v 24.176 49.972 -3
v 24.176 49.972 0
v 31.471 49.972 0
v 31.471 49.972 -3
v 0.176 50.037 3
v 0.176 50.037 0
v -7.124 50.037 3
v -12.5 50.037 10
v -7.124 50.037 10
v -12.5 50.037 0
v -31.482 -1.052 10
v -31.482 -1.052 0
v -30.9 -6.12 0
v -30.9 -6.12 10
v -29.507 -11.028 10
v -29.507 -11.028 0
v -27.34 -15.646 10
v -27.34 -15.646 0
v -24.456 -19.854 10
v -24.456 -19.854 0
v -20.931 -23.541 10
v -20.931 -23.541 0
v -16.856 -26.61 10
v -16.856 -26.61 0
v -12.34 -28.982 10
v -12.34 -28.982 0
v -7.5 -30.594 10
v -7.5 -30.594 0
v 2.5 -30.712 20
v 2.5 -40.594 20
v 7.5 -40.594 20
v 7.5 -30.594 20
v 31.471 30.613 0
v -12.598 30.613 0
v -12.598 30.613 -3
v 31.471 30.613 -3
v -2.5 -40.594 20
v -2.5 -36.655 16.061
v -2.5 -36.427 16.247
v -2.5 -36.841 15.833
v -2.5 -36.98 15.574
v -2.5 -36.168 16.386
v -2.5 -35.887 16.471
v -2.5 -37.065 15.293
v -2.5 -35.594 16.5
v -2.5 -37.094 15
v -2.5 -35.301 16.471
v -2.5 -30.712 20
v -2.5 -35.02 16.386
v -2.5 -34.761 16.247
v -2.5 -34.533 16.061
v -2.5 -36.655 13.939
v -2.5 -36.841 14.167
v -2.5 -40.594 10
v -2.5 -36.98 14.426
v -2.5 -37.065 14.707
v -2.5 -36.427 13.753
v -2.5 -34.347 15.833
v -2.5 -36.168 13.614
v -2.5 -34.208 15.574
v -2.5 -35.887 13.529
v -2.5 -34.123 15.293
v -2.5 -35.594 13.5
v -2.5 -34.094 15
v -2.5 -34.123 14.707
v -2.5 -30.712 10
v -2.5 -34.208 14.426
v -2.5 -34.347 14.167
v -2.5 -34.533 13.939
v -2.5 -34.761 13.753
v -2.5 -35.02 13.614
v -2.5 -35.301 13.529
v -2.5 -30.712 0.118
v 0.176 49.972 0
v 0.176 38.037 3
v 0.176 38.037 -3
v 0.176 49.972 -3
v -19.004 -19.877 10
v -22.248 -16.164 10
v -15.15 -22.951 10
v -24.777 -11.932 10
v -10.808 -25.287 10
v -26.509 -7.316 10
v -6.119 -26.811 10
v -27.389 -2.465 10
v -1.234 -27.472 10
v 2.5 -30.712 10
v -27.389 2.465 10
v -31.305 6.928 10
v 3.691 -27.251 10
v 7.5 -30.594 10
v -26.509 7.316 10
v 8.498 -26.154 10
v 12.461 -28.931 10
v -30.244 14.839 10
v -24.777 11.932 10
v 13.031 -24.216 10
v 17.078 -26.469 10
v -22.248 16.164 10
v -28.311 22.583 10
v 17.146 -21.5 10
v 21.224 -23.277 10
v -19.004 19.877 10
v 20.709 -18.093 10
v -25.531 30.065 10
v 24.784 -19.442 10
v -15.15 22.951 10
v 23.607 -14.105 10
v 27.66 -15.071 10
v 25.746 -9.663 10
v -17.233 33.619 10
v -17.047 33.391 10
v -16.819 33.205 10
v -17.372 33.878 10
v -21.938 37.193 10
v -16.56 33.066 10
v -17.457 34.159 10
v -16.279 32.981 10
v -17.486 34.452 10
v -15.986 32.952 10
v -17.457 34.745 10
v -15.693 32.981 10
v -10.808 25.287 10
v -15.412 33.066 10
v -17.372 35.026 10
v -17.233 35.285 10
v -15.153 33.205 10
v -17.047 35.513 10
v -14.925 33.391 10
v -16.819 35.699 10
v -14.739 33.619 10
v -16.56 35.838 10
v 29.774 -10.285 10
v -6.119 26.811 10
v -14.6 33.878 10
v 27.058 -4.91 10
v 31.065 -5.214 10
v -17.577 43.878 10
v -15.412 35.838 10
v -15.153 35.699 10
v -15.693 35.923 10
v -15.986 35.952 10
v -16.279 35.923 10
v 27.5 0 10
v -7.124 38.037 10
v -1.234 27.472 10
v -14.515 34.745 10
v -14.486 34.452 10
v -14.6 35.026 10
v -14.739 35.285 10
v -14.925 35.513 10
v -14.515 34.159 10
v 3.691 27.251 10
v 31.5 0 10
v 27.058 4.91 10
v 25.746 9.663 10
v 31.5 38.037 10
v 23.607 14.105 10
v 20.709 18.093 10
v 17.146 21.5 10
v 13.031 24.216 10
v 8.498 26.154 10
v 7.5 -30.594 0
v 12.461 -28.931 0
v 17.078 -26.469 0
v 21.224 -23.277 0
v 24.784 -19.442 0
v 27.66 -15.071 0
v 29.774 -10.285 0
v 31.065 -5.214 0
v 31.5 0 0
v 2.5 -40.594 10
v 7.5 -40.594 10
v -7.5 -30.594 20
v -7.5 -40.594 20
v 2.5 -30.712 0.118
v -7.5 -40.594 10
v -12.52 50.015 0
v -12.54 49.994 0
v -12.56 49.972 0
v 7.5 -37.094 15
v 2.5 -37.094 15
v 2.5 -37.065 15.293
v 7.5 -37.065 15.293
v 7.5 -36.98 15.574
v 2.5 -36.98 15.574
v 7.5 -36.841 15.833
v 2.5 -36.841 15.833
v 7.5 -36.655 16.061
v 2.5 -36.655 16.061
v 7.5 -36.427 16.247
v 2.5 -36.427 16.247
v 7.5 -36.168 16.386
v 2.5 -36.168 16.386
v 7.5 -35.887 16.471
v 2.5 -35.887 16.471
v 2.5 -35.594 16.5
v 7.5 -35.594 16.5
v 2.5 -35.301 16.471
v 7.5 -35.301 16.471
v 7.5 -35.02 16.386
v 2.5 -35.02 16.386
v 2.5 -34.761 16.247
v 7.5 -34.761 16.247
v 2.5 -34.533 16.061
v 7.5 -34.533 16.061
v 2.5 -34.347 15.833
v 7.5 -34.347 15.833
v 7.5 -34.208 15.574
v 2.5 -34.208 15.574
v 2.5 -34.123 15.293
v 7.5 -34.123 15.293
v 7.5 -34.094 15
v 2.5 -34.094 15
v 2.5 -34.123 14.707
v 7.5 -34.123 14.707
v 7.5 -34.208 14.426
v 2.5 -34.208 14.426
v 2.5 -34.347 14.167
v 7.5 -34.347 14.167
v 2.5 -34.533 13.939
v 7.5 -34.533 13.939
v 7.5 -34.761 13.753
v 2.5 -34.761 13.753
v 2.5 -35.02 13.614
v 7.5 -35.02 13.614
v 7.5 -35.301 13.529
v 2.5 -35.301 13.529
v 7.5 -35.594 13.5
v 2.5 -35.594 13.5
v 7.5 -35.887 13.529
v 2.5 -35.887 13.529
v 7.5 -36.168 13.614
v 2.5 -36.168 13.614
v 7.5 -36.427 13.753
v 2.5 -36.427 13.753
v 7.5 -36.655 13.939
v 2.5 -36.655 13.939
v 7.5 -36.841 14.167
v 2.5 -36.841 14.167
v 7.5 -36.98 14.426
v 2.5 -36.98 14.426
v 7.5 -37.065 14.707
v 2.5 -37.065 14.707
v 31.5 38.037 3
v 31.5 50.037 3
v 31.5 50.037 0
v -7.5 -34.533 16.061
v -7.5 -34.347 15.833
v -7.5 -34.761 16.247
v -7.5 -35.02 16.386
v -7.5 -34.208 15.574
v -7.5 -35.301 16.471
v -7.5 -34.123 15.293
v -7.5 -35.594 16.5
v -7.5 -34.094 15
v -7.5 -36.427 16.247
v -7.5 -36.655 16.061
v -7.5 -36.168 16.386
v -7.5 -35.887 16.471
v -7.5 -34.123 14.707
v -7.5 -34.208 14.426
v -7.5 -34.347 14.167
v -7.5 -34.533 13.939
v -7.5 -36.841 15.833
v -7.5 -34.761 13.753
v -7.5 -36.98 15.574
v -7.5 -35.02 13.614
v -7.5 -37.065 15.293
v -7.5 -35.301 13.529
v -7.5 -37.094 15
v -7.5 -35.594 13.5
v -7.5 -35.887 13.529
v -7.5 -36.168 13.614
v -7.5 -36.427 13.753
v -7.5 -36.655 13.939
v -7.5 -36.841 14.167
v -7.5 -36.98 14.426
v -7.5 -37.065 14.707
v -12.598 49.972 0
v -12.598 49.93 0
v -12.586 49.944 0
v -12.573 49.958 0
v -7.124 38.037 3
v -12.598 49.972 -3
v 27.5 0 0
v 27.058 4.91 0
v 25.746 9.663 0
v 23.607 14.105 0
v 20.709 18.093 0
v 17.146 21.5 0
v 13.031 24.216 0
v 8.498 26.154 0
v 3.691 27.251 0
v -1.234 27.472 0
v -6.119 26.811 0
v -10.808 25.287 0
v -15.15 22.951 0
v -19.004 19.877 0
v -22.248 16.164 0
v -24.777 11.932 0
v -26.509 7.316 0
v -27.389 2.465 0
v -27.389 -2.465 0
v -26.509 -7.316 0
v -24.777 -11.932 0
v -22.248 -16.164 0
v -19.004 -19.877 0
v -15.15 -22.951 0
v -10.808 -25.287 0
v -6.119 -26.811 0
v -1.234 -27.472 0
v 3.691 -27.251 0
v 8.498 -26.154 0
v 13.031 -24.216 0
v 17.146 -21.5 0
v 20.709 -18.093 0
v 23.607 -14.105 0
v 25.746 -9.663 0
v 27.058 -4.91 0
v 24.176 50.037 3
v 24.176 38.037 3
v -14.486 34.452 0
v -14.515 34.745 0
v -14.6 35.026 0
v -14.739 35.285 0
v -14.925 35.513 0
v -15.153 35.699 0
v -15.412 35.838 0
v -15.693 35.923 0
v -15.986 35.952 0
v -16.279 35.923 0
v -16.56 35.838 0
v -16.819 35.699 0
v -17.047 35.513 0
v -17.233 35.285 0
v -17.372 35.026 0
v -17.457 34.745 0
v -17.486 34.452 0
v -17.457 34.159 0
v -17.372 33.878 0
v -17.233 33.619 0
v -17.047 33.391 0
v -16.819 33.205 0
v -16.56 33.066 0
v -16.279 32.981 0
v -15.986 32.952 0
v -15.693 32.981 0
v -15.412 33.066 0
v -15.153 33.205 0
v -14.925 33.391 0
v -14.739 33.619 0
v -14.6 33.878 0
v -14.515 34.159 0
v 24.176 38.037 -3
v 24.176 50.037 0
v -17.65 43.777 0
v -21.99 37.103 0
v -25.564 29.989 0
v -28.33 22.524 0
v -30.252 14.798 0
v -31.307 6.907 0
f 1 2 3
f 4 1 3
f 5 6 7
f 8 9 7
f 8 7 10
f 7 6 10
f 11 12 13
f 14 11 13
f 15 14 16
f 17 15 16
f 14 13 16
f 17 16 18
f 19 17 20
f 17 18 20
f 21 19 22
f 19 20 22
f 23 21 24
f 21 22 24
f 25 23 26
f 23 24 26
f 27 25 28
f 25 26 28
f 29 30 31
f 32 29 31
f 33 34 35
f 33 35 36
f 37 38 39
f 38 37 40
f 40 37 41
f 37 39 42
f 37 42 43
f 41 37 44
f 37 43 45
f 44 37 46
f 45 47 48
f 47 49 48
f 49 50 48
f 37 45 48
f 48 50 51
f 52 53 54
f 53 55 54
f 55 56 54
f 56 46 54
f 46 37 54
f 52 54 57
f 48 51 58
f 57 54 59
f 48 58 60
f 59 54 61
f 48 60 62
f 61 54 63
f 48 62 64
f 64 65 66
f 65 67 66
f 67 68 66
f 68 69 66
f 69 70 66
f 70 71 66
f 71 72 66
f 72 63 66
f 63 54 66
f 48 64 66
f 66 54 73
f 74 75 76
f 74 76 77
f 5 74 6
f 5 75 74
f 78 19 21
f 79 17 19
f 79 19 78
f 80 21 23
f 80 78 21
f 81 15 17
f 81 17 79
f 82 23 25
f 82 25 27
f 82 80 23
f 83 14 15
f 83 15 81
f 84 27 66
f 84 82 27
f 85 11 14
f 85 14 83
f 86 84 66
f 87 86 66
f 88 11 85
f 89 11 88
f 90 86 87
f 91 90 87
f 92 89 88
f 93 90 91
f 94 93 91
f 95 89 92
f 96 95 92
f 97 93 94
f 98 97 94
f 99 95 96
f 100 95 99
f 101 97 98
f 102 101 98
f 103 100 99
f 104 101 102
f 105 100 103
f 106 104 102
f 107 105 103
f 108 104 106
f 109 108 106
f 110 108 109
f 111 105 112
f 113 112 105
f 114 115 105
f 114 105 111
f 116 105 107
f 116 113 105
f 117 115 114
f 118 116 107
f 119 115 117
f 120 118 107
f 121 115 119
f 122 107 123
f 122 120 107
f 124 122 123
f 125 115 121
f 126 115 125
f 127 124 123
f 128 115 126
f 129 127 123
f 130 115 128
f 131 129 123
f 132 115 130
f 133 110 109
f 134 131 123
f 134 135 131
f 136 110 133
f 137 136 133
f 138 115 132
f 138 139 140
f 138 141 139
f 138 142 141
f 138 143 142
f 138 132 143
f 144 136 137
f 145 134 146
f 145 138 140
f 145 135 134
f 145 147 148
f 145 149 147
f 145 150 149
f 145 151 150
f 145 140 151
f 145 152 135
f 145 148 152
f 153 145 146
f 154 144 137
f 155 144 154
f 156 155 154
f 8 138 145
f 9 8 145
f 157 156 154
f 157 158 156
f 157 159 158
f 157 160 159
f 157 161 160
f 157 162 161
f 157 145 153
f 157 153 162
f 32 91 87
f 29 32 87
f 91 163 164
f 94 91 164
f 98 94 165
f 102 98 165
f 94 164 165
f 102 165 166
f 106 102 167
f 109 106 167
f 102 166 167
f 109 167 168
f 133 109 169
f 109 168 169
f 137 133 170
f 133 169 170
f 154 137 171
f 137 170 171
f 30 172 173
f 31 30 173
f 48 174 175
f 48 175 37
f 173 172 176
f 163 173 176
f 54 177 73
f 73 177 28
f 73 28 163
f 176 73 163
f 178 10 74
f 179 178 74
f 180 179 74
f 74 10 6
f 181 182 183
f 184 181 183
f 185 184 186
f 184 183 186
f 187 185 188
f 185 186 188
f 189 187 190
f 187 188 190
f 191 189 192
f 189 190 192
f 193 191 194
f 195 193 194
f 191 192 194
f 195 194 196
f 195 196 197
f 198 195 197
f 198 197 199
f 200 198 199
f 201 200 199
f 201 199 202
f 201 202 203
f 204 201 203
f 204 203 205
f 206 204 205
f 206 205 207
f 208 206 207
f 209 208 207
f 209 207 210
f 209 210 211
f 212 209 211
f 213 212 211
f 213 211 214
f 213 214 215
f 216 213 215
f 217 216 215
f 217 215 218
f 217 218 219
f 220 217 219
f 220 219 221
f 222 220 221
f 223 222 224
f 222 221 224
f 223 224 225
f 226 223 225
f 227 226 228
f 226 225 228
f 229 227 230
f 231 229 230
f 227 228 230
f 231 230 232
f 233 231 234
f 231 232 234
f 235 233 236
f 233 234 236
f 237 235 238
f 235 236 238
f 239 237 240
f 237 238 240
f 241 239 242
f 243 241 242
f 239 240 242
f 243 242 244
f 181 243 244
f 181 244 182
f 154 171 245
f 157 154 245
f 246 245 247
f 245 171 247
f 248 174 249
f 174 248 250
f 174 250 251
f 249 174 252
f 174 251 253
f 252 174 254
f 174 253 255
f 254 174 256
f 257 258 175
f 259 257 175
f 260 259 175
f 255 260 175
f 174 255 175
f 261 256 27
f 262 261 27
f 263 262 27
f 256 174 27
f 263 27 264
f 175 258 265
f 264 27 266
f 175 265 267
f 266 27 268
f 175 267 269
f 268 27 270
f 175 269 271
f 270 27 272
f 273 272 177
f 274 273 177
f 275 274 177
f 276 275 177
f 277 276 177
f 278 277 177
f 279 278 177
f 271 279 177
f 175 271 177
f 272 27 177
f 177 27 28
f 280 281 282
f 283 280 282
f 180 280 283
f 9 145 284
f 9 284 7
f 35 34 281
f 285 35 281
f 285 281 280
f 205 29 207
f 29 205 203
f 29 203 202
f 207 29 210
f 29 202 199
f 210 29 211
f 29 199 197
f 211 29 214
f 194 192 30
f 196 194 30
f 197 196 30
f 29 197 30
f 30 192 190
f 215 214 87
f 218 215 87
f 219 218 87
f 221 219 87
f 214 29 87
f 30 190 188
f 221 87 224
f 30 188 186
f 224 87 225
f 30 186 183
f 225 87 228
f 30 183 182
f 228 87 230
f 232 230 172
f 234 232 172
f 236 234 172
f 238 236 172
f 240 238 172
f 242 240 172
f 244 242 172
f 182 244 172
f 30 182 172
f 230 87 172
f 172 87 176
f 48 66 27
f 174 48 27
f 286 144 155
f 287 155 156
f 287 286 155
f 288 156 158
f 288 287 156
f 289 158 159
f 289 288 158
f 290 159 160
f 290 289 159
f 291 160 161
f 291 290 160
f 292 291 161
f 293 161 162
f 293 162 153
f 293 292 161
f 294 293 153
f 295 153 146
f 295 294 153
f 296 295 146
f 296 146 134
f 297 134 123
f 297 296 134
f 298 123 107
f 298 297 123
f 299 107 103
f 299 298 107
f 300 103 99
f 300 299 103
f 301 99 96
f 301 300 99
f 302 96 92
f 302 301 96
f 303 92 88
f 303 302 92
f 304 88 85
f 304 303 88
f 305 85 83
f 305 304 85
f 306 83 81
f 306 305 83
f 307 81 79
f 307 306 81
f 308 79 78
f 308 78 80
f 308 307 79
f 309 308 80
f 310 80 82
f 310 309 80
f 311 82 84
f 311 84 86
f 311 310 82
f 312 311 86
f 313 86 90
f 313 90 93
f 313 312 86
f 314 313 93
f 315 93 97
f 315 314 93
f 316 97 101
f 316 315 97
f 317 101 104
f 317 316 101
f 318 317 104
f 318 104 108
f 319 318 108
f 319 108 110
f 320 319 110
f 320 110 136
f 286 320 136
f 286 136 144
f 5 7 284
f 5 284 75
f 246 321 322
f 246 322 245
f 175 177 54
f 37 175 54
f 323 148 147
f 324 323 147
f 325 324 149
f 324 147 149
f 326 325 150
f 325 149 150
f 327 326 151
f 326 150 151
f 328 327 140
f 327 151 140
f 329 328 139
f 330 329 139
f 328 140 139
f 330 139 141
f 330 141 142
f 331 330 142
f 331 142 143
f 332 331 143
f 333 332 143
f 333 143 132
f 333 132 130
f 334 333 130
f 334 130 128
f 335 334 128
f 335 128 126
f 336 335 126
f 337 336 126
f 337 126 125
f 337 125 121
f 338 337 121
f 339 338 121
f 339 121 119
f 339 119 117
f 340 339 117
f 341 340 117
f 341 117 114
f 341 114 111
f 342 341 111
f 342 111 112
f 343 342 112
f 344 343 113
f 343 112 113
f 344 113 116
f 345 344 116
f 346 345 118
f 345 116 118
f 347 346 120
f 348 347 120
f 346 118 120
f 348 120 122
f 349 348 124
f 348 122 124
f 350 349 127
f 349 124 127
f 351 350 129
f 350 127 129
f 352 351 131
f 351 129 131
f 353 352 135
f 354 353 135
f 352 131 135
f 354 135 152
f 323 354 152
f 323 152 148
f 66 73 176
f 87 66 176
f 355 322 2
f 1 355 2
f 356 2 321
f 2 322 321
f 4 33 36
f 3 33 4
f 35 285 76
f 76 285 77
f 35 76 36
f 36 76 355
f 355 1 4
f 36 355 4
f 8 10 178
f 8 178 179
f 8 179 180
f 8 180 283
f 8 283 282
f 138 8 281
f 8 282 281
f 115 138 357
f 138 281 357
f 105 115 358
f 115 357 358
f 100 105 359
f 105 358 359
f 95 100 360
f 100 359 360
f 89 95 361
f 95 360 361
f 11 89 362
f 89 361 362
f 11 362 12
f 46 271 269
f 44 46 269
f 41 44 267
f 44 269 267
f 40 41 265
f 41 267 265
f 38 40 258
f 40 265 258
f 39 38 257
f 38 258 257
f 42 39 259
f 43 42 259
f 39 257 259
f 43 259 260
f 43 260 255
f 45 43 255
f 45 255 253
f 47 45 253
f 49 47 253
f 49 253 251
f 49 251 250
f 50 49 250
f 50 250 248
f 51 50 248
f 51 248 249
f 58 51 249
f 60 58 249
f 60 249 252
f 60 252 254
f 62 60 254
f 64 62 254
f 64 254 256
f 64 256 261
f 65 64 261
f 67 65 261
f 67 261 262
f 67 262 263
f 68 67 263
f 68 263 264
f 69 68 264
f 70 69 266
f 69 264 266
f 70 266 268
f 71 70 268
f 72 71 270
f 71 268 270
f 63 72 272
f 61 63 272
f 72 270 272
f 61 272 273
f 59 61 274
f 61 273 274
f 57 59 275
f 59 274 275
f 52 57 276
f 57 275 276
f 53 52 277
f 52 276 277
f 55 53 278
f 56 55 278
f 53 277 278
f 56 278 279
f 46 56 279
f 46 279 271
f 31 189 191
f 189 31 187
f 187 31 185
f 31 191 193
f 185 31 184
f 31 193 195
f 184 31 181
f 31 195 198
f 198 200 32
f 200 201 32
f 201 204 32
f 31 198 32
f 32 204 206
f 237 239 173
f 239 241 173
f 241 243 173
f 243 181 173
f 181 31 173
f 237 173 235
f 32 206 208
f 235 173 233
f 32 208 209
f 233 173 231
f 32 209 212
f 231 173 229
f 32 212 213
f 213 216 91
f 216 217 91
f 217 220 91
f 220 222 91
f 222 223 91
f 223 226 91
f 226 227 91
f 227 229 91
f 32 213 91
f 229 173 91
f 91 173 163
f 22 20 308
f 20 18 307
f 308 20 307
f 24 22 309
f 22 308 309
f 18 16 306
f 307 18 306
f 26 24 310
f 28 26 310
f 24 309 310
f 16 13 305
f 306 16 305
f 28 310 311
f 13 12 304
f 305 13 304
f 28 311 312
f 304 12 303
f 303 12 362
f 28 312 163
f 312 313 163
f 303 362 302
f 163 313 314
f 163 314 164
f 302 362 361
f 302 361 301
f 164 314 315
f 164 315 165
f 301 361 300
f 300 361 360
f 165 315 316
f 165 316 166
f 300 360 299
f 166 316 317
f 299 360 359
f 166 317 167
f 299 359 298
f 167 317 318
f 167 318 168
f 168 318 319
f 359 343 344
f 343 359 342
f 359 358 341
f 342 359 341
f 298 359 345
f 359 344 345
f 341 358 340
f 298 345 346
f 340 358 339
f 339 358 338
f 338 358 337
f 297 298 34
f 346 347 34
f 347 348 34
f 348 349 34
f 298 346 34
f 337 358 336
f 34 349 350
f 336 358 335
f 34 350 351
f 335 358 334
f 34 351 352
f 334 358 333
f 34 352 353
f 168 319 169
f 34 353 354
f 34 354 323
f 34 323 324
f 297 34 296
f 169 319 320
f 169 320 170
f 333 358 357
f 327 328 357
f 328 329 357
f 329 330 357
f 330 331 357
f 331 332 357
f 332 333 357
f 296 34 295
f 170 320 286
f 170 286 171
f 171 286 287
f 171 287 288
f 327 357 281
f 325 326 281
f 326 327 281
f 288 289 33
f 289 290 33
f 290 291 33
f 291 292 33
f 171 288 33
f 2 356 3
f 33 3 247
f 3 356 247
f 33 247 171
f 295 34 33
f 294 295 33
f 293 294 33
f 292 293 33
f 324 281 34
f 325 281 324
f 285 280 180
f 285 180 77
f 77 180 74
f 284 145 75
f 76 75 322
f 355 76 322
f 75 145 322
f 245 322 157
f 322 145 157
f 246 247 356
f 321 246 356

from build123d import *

# Parameters (mm, degrees)
F0_R      = 27.5
F1_DEPTH  = 10
F2_DEPTH  = 20
F4_DEPTH  = 25
F5_W      = 40
F5_H      = 12
F6_DEPTH  = 7
F8_W      = 44.069208
F8_H      = 19.358708
F9_DEPTH  = 3
F7_W      = 24
F7_H      = 12
F10_DEPTH = 25
F11_R     = 1.5
F12_DEPTH = 25
F13_R     = 1.5
F14_DEPTH = 25


with BuildPart() as f1:
    # F0 (on Top) → F1 (new body)
    with BuildSketch(Plane.XY):
        with BuildLine():
            ThreePointArc((-12.5, 50.037254), (-27.025356, 26.362934), (-31.482419, -1.052282))
            ThreePointArc((-31.482419, -1.052282), (-24.455823, -19.853532), (-7.5, -30.594117))
            Line((-7.5, -30.594117), (-2.5, -30.712094))
            Line((-2.5, -30.712094), (2.5, -30.712094))
            Line((2.5, -30.712094), (7.5, -30.594117))
            ThreePointArc((7.5, -30.594117), (24.784067, -19.442222), (31.5, 0))
            Line((31.5, 0), (31.5, 50.037254))
            Line((31.5, 50.037254), (-12.5, 50.037254))
        make_face()
        Circle(F0_R, mode=Mode.SUBTRACT)
    extrude(amount=F1_DEPTH)

    # F0 (on Top) → F2 (join)
    with BuildSketch(Plane.XY):
        Polygon((7.5, -30.594117), (2.5, -30.712094), (2.5, -40.594117), (7.5, -40.594117), align=None)
        Polygon((-2.5, -30.712094), (-7.5, -30.594117), (-7.5, -40.594117), (-2.5, -40.594117), align=None)
    extrude(amount=F2_DEPTH)

    # F3 (on face) → F4 (cut)
    with BuildSketch(Plane(origin=(-7.5, 0, 0), x_dir=(0, -1, 0), z_dir=(-1, 0, 0))):
        Polygon((40.594117, 10), (30.594117, 0), (40.594117, 0), align=None)
    extrude(amount=-F4_DEPTH, mode=Mode.SUBTRACT)

    # F5 (on face) → F6 (cut)
    with BuildSketch(Plane.XY.offset(10)):
        with Locations((12.876151, 44.037254)):
            Rectangle(F5_W, F5_H)
    extrude(amount=-F6_DEPTH, mode=Mode.SUBTRACT)

    # F8 (on face) → F9 (join)
    with BuildSketch(Plane.XY):
        with Locations((9.436336, 40.292357)):
            Rectangle(F8_W, F8_H)
    extrude(amount=-F9_DEPTH)

    # F7 (on face) → F10 (cut)
    with BuildSketch(Plane.XY.offset(3)):
        with Locations((12.176151, 44.037254)):
            Rectangle(F7_W, F7_H)
    extrude(amount=-F10_DEPTH, mode=Mode.SUBTRACT)

    # F11 (on face) → F12 (cut)
    with BuildSketch(Plane.XY.offset(10)):
        with Locations((-15.985942, 34.45212)):
            Circle(F11_R)
    extrude(amount=-F12_DEPTH, mode=Mode.SUBTRACT)

    # F13 (on face) → F14 (cut)
    with BuildSketch(Plane(origin=(-7.5, 0, 0), x_dir=(0, -1, 0), z_dir=(-1, 0, 0))):
        with Locations((35.594117, 15)):
            Circle(F13_R)
    extrude(amount=-F14_DEPTH, mode=Mode.SUBTRACT)


solid = f1.part
